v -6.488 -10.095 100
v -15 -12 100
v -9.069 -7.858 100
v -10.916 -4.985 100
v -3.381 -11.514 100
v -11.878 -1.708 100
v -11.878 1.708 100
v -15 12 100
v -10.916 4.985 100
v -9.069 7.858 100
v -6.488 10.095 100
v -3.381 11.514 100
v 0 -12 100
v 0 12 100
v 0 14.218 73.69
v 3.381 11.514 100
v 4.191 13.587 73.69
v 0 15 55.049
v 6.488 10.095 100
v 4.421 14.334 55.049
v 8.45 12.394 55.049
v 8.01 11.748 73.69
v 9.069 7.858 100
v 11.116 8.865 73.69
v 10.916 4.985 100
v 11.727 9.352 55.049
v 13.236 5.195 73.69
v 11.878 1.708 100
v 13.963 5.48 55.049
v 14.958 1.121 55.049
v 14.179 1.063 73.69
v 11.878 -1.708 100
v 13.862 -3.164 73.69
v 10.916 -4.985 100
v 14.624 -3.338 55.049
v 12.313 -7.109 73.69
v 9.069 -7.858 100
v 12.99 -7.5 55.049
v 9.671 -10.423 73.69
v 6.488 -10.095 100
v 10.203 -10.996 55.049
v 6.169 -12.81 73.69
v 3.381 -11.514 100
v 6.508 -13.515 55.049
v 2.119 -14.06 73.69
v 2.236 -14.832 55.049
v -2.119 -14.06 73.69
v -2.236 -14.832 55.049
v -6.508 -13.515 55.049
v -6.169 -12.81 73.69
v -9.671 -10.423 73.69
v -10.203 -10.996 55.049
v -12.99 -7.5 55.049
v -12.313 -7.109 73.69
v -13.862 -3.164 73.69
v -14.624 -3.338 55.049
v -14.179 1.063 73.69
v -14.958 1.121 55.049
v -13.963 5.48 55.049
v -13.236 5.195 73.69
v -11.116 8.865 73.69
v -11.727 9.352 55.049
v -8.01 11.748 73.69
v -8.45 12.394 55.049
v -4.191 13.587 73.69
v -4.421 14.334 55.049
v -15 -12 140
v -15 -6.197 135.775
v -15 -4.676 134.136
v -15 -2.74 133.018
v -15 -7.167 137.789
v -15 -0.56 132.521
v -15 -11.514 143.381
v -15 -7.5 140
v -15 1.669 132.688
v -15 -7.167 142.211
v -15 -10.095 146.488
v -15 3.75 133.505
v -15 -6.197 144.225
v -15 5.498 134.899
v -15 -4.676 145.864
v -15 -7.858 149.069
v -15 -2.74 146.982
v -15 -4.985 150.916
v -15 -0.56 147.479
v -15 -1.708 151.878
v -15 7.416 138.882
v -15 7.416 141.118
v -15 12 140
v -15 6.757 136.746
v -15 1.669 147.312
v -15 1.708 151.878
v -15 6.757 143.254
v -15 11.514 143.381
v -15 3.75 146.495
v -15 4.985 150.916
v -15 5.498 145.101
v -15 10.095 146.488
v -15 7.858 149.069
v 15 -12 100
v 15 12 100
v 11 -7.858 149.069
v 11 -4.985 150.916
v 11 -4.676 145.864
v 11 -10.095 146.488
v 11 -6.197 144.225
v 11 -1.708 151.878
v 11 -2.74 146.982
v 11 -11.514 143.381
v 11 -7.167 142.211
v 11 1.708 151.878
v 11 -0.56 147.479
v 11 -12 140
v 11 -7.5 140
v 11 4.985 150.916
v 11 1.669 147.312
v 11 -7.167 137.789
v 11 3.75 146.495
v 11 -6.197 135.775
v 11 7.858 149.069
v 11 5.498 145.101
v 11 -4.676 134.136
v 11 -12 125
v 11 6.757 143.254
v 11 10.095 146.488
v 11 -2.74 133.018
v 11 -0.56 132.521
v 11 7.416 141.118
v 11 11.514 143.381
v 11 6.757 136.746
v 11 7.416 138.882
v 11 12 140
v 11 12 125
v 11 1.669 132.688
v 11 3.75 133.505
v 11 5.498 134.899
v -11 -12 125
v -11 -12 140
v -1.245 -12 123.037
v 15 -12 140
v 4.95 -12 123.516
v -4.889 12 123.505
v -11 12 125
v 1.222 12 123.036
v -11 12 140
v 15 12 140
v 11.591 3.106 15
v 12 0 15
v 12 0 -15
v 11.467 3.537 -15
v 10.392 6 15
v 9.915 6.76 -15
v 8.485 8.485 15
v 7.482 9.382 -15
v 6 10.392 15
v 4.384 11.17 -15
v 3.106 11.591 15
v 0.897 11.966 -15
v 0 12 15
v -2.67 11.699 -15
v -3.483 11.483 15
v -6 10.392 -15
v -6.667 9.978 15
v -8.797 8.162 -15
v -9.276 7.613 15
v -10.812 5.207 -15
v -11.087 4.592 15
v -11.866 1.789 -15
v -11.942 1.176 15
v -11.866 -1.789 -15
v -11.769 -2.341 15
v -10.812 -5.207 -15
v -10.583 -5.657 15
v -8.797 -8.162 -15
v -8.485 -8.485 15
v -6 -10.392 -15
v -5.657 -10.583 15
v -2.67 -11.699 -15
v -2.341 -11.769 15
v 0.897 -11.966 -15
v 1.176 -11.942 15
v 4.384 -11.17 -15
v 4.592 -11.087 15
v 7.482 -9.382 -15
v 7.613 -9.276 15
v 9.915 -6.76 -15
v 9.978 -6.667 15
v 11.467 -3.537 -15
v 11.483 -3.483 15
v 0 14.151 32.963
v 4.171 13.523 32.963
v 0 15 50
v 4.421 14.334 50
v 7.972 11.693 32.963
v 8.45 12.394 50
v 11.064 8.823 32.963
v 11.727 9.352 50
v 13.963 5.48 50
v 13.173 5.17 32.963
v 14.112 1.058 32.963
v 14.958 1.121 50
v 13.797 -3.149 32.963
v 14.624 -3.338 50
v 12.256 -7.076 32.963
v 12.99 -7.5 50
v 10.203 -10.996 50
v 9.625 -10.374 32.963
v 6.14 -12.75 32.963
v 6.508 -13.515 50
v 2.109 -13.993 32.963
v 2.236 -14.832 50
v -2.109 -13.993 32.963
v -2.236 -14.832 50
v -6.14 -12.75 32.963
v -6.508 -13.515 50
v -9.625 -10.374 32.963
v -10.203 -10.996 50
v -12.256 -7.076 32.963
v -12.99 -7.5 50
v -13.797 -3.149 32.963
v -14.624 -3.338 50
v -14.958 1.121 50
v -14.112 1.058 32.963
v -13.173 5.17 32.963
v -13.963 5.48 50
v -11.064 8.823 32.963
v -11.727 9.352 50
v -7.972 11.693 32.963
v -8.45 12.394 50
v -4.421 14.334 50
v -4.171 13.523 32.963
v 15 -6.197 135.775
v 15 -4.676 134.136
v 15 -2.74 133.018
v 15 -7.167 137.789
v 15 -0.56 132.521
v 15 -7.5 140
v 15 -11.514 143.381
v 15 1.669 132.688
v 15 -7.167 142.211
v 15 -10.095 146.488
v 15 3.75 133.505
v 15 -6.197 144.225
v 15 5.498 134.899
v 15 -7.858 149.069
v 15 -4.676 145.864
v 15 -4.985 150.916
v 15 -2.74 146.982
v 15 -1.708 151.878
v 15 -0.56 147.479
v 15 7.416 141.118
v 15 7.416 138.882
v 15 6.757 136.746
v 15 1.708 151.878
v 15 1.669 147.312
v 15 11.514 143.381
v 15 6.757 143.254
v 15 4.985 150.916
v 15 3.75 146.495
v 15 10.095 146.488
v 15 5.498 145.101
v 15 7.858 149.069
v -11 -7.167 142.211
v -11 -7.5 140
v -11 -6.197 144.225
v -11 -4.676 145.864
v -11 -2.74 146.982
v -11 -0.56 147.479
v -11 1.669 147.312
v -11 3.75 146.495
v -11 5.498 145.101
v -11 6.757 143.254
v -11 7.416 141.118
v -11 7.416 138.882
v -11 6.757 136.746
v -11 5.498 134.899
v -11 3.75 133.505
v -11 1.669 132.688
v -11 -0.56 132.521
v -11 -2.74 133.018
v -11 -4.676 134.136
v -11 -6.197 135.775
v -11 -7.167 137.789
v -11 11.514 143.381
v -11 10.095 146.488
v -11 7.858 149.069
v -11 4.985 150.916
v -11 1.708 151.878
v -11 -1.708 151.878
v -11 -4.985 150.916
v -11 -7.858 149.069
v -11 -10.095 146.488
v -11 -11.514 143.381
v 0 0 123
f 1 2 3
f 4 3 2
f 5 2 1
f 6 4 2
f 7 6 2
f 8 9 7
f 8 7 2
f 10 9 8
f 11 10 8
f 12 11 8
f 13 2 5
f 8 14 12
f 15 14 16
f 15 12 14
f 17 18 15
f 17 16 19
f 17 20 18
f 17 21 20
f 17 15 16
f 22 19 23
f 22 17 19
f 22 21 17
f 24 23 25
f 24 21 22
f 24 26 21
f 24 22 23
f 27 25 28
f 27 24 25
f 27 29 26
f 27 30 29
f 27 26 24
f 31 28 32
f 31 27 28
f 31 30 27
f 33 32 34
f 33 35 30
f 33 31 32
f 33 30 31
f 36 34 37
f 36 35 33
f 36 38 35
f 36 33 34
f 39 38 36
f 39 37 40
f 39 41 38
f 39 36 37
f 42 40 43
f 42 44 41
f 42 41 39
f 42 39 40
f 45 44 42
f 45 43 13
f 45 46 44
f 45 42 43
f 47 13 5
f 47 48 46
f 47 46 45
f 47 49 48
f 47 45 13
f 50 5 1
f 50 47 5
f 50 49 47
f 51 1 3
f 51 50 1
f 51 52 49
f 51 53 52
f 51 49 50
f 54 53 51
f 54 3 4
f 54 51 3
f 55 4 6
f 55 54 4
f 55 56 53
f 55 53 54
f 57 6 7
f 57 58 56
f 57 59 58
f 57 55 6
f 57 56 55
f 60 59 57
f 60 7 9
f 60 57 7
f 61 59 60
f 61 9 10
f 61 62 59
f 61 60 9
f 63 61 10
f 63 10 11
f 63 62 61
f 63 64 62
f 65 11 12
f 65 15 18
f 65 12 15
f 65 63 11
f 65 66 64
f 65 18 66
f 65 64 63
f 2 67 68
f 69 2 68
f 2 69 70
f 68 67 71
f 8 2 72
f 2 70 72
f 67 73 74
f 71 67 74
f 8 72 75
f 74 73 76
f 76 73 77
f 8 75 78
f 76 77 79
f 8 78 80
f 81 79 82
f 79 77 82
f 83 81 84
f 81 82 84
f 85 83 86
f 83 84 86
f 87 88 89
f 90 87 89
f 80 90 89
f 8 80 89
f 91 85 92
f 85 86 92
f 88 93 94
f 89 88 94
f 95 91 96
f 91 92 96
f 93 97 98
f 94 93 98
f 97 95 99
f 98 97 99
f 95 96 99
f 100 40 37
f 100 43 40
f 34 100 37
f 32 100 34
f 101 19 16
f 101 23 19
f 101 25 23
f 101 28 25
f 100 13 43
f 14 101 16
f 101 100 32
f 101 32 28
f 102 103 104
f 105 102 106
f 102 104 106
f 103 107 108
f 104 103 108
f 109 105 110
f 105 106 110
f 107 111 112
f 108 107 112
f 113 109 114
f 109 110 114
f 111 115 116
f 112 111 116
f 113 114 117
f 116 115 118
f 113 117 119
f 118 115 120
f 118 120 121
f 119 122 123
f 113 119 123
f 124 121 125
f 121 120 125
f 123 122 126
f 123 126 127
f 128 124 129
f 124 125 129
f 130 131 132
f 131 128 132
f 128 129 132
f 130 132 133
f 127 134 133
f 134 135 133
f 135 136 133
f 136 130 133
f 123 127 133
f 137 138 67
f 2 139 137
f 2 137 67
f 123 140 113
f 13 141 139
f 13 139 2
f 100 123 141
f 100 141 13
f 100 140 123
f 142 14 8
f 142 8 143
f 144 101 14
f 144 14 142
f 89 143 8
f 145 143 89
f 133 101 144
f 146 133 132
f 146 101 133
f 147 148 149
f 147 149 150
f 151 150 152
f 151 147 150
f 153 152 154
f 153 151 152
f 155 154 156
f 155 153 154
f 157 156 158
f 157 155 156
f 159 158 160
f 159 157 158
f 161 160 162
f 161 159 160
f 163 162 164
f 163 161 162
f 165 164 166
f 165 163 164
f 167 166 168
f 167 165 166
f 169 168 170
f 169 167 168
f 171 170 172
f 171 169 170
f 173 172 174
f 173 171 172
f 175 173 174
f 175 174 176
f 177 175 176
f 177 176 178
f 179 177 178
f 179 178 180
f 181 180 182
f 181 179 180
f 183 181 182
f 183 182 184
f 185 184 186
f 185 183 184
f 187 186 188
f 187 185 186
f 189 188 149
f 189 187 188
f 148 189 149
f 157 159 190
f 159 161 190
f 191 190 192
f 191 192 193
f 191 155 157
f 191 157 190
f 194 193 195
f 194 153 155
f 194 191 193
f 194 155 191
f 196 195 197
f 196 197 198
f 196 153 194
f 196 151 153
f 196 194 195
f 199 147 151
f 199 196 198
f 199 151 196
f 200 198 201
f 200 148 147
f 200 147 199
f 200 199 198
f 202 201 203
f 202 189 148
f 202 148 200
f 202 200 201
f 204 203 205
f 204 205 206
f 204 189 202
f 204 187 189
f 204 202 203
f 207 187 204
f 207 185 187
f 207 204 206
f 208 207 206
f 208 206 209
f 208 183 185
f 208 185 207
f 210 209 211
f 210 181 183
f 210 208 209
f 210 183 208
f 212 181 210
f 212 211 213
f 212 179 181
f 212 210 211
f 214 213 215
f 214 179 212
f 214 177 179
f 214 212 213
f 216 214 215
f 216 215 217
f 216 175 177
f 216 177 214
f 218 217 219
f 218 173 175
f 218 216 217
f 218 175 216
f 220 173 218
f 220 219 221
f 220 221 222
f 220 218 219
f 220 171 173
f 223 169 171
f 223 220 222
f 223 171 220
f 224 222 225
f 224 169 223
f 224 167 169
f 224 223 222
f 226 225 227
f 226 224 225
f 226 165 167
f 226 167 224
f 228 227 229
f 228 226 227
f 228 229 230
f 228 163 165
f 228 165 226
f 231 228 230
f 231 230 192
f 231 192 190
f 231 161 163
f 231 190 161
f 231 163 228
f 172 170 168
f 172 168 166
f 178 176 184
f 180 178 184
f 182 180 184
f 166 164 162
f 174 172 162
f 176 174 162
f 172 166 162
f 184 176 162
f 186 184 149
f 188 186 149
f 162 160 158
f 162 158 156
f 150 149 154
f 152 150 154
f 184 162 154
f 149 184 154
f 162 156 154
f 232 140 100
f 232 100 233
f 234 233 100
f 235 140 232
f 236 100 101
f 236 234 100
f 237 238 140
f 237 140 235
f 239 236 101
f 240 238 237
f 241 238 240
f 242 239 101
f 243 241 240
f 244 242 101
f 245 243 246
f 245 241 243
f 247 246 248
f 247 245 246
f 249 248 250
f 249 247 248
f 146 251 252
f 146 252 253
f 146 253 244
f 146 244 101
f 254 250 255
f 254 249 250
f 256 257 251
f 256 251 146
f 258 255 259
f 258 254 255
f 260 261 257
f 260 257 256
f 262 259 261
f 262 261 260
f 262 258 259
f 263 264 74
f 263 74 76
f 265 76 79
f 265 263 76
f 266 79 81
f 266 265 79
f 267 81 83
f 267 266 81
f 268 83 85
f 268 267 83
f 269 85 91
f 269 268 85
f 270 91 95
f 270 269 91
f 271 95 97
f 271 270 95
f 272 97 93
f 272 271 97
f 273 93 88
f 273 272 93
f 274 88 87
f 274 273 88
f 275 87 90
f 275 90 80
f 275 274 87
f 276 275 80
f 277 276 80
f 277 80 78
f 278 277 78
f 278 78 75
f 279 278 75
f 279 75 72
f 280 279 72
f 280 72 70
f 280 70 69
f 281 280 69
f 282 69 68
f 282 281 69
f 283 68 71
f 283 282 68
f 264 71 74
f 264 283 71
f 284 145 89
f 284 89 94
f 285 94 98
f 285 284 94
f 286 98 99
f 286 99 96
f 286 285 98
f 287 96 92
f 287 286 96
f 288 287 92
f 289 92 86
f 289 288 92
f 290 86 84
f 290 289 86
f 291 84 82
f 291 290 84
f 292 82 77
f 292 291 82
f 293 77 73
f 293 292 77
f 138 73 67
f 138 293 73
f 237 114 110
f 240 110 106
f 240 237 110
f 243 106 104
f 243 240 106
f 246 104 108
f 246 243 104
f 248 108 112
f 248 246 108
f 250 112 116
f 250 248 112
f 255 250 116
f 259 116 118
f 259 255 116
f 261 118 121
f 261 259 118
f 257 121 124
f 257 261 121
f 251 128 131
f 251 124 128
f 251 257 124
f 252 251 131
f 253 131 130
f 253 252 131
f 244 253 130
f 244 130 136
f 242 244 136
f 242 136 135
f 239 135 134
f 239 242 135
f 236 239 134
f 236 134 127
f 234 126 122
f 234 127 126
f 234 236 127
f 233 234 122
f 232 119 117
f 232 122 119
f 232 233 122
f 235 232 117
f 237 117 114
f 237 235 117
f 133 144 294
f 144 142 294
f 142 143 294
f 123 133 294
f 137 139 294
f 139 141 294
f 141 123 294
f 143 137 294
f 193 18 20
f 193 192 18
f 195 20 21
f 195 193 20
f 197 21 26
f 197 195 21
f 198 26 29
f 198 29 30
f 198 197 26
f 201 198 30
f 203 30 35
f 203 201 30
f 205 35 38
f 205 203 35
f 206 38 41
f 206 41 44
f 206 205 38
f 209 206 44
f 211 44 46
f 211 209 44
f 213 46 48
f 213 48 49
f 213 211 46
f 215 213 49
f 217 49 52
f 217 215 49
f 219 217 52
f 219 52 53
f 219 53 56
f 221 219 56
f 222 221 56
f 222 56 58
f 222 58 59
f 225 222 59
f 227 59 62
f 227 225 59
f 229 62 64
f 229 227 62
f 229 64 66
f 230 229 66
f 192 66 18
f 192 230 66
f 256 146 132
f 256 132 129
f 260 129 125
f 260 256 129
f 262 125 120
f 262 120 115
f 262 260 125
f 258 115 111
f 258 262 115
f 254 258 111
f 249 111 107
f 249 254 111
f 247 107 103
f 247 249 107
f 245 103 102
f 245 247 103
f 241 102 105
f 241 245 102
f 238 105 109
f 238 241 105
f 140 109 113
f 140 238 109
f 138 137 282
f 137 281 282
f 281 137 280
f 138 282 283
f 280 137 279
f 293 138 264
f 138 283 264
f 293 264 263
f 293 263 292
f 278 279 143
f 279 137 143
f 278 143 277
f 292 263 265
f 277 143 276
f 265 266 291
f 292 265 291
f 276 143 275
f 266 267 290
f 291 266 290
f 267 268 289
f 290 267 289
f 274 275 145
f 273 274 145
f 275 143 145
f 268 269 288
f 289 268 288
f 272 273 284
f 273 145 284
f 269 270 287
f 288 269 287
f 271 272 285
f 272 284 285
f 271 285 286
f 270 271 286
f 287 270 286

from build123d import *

# Parameters (mm, degrees)
F0_R     = 12
F1_DEPTH = 15
F2_W     = 12
F2_H     = 85
F5_DEPTH = 15
F6_W     = 22
F6_H     = 2
F6_H_2   = 15
F7_DEPTH = 25.4


with BuildPart() as f1:
    # F0 (on Top) → F1 (new body, symmetric)
    with BuildSketch(Plane.XY):
        Circle(F0_R)
    extrude(amount=F1_DEPTH, both=True)

    # F2 (on Right) → F3 (revolve)
    with BuildSketch(Plane.YZ):
        with Locations((6, 57.5)):
            Rectangle(F2_W, F2_H)
        with BuildLine():
            Line((12, 100), (12, 15))
            add(Edge.make_bspline(
                [(15, 50), (14.8483760761, 36.7983569986), (13.4529237629, 24.5626545335), (12, 15)],
                knots=[0.5442355016, 0.5442355016, 0.5442355016, 0.5442355016, 1, 1, 1, 1], degree=3))
            Line((15, 50), (15, 55.0494137852))
            add(Edge.make_bspline(
                [(12, 100), (13.4204155957, 84.714924594), (14.8440376845, 69.3918255439), (15, 55.0494137852)],
                knots=[0, 0, 0, 0, 0.4866410928, 0.4866410928, 0.4866410928, 0.4866410928], degree=3))
        make_face()
        with BuildLine():
            Line((15, 55.0494137852), (15, 50))
            add(Edge.make_bspline(
                [(15, 55.0494137852), (15.0184582796, 53.3519765173), (15.019160532, 51.6682756719), (15, 50)],
                knots=[0.4866410928, 0.4866410928, 0.4866410928, 0.4866410928, 0.5442355016, 0.5442355016, 0.5442355016, 0.5442355016], degree=3))
        make_face()
    revolve(axis=Axis((0, 0, 50), (0, 0, -1)))

    # F4 (on Right) → F5 (join, symmetric)
    with BuildSketch(Plane.YZ):
        with BuildLine():
            Line((-12, 100), (12, 100))
            Line((12, 100), (12, 140))
            ThreePointArc((12, 140), (0, 128), (-12, 140))
            Line((-12, 140), (-12, 100))
        make_face()
        with BuildLine():
            ThreePointArc((-12, 140), (0, 128), (12, 140))
            Line((12, 140), (7.5, 140))
            ThreePointArc((7.5, 140), (0, 132.5), (-7.5, 140))
            Line((-7.5, 140), (-12, 140))
        make_face()
        with BuildLine():
            Line((7.5, 140), (12, 140))
            ThreePointArc((12, 140), (0, 152), (-12, 140))
            Line((-12, 140), (-7.5, 140))
            ThreePointArc((-7.5, 140), (0, 147.5), (7.5, 140))
        make_face()
    extrude(amount=F5_DEPTH, both=True)

    # F6 (on face) → F7 (cut)
    with BuildSketch(Plane(origin=(0, 12, 0), x_dir=(-1, 0, 0), z_dir=(0, 1, 0))):
        with Locations((0, 156)):
            Rectangle(F6_W, F6_H)
        with BuildLine():
            add(Edge.make_bspline(
                [(0, 123), (3.6666666667, 123), (7.3333333333, 124), (11, 125)],
                knots=[0.5, 0.5, 0.5, 0.5, 1, 1, 1, 1], degree=3))
            Line((11, 125), (-11, 125))
            add(Edge.make_bspline(
                [(-11, 125), (-7.3333333333, 124), (-3.6666666667, 123), (0, 123)],
                knots=[0, 0, 0, 0, 0.5, 0.5, 0.5, 0.5], degree=3))
        make_face()
        with Locations((0, 147.5)):
            Rectangle(F6_W, F6_H_2)
        with Locations((0, 132.5)):
            Rectangle(F6_W, F6_H_2)
    extrude(amount=-F7_DEPTH, mode=Mode.SUBTRACT)


solid = f1.part
